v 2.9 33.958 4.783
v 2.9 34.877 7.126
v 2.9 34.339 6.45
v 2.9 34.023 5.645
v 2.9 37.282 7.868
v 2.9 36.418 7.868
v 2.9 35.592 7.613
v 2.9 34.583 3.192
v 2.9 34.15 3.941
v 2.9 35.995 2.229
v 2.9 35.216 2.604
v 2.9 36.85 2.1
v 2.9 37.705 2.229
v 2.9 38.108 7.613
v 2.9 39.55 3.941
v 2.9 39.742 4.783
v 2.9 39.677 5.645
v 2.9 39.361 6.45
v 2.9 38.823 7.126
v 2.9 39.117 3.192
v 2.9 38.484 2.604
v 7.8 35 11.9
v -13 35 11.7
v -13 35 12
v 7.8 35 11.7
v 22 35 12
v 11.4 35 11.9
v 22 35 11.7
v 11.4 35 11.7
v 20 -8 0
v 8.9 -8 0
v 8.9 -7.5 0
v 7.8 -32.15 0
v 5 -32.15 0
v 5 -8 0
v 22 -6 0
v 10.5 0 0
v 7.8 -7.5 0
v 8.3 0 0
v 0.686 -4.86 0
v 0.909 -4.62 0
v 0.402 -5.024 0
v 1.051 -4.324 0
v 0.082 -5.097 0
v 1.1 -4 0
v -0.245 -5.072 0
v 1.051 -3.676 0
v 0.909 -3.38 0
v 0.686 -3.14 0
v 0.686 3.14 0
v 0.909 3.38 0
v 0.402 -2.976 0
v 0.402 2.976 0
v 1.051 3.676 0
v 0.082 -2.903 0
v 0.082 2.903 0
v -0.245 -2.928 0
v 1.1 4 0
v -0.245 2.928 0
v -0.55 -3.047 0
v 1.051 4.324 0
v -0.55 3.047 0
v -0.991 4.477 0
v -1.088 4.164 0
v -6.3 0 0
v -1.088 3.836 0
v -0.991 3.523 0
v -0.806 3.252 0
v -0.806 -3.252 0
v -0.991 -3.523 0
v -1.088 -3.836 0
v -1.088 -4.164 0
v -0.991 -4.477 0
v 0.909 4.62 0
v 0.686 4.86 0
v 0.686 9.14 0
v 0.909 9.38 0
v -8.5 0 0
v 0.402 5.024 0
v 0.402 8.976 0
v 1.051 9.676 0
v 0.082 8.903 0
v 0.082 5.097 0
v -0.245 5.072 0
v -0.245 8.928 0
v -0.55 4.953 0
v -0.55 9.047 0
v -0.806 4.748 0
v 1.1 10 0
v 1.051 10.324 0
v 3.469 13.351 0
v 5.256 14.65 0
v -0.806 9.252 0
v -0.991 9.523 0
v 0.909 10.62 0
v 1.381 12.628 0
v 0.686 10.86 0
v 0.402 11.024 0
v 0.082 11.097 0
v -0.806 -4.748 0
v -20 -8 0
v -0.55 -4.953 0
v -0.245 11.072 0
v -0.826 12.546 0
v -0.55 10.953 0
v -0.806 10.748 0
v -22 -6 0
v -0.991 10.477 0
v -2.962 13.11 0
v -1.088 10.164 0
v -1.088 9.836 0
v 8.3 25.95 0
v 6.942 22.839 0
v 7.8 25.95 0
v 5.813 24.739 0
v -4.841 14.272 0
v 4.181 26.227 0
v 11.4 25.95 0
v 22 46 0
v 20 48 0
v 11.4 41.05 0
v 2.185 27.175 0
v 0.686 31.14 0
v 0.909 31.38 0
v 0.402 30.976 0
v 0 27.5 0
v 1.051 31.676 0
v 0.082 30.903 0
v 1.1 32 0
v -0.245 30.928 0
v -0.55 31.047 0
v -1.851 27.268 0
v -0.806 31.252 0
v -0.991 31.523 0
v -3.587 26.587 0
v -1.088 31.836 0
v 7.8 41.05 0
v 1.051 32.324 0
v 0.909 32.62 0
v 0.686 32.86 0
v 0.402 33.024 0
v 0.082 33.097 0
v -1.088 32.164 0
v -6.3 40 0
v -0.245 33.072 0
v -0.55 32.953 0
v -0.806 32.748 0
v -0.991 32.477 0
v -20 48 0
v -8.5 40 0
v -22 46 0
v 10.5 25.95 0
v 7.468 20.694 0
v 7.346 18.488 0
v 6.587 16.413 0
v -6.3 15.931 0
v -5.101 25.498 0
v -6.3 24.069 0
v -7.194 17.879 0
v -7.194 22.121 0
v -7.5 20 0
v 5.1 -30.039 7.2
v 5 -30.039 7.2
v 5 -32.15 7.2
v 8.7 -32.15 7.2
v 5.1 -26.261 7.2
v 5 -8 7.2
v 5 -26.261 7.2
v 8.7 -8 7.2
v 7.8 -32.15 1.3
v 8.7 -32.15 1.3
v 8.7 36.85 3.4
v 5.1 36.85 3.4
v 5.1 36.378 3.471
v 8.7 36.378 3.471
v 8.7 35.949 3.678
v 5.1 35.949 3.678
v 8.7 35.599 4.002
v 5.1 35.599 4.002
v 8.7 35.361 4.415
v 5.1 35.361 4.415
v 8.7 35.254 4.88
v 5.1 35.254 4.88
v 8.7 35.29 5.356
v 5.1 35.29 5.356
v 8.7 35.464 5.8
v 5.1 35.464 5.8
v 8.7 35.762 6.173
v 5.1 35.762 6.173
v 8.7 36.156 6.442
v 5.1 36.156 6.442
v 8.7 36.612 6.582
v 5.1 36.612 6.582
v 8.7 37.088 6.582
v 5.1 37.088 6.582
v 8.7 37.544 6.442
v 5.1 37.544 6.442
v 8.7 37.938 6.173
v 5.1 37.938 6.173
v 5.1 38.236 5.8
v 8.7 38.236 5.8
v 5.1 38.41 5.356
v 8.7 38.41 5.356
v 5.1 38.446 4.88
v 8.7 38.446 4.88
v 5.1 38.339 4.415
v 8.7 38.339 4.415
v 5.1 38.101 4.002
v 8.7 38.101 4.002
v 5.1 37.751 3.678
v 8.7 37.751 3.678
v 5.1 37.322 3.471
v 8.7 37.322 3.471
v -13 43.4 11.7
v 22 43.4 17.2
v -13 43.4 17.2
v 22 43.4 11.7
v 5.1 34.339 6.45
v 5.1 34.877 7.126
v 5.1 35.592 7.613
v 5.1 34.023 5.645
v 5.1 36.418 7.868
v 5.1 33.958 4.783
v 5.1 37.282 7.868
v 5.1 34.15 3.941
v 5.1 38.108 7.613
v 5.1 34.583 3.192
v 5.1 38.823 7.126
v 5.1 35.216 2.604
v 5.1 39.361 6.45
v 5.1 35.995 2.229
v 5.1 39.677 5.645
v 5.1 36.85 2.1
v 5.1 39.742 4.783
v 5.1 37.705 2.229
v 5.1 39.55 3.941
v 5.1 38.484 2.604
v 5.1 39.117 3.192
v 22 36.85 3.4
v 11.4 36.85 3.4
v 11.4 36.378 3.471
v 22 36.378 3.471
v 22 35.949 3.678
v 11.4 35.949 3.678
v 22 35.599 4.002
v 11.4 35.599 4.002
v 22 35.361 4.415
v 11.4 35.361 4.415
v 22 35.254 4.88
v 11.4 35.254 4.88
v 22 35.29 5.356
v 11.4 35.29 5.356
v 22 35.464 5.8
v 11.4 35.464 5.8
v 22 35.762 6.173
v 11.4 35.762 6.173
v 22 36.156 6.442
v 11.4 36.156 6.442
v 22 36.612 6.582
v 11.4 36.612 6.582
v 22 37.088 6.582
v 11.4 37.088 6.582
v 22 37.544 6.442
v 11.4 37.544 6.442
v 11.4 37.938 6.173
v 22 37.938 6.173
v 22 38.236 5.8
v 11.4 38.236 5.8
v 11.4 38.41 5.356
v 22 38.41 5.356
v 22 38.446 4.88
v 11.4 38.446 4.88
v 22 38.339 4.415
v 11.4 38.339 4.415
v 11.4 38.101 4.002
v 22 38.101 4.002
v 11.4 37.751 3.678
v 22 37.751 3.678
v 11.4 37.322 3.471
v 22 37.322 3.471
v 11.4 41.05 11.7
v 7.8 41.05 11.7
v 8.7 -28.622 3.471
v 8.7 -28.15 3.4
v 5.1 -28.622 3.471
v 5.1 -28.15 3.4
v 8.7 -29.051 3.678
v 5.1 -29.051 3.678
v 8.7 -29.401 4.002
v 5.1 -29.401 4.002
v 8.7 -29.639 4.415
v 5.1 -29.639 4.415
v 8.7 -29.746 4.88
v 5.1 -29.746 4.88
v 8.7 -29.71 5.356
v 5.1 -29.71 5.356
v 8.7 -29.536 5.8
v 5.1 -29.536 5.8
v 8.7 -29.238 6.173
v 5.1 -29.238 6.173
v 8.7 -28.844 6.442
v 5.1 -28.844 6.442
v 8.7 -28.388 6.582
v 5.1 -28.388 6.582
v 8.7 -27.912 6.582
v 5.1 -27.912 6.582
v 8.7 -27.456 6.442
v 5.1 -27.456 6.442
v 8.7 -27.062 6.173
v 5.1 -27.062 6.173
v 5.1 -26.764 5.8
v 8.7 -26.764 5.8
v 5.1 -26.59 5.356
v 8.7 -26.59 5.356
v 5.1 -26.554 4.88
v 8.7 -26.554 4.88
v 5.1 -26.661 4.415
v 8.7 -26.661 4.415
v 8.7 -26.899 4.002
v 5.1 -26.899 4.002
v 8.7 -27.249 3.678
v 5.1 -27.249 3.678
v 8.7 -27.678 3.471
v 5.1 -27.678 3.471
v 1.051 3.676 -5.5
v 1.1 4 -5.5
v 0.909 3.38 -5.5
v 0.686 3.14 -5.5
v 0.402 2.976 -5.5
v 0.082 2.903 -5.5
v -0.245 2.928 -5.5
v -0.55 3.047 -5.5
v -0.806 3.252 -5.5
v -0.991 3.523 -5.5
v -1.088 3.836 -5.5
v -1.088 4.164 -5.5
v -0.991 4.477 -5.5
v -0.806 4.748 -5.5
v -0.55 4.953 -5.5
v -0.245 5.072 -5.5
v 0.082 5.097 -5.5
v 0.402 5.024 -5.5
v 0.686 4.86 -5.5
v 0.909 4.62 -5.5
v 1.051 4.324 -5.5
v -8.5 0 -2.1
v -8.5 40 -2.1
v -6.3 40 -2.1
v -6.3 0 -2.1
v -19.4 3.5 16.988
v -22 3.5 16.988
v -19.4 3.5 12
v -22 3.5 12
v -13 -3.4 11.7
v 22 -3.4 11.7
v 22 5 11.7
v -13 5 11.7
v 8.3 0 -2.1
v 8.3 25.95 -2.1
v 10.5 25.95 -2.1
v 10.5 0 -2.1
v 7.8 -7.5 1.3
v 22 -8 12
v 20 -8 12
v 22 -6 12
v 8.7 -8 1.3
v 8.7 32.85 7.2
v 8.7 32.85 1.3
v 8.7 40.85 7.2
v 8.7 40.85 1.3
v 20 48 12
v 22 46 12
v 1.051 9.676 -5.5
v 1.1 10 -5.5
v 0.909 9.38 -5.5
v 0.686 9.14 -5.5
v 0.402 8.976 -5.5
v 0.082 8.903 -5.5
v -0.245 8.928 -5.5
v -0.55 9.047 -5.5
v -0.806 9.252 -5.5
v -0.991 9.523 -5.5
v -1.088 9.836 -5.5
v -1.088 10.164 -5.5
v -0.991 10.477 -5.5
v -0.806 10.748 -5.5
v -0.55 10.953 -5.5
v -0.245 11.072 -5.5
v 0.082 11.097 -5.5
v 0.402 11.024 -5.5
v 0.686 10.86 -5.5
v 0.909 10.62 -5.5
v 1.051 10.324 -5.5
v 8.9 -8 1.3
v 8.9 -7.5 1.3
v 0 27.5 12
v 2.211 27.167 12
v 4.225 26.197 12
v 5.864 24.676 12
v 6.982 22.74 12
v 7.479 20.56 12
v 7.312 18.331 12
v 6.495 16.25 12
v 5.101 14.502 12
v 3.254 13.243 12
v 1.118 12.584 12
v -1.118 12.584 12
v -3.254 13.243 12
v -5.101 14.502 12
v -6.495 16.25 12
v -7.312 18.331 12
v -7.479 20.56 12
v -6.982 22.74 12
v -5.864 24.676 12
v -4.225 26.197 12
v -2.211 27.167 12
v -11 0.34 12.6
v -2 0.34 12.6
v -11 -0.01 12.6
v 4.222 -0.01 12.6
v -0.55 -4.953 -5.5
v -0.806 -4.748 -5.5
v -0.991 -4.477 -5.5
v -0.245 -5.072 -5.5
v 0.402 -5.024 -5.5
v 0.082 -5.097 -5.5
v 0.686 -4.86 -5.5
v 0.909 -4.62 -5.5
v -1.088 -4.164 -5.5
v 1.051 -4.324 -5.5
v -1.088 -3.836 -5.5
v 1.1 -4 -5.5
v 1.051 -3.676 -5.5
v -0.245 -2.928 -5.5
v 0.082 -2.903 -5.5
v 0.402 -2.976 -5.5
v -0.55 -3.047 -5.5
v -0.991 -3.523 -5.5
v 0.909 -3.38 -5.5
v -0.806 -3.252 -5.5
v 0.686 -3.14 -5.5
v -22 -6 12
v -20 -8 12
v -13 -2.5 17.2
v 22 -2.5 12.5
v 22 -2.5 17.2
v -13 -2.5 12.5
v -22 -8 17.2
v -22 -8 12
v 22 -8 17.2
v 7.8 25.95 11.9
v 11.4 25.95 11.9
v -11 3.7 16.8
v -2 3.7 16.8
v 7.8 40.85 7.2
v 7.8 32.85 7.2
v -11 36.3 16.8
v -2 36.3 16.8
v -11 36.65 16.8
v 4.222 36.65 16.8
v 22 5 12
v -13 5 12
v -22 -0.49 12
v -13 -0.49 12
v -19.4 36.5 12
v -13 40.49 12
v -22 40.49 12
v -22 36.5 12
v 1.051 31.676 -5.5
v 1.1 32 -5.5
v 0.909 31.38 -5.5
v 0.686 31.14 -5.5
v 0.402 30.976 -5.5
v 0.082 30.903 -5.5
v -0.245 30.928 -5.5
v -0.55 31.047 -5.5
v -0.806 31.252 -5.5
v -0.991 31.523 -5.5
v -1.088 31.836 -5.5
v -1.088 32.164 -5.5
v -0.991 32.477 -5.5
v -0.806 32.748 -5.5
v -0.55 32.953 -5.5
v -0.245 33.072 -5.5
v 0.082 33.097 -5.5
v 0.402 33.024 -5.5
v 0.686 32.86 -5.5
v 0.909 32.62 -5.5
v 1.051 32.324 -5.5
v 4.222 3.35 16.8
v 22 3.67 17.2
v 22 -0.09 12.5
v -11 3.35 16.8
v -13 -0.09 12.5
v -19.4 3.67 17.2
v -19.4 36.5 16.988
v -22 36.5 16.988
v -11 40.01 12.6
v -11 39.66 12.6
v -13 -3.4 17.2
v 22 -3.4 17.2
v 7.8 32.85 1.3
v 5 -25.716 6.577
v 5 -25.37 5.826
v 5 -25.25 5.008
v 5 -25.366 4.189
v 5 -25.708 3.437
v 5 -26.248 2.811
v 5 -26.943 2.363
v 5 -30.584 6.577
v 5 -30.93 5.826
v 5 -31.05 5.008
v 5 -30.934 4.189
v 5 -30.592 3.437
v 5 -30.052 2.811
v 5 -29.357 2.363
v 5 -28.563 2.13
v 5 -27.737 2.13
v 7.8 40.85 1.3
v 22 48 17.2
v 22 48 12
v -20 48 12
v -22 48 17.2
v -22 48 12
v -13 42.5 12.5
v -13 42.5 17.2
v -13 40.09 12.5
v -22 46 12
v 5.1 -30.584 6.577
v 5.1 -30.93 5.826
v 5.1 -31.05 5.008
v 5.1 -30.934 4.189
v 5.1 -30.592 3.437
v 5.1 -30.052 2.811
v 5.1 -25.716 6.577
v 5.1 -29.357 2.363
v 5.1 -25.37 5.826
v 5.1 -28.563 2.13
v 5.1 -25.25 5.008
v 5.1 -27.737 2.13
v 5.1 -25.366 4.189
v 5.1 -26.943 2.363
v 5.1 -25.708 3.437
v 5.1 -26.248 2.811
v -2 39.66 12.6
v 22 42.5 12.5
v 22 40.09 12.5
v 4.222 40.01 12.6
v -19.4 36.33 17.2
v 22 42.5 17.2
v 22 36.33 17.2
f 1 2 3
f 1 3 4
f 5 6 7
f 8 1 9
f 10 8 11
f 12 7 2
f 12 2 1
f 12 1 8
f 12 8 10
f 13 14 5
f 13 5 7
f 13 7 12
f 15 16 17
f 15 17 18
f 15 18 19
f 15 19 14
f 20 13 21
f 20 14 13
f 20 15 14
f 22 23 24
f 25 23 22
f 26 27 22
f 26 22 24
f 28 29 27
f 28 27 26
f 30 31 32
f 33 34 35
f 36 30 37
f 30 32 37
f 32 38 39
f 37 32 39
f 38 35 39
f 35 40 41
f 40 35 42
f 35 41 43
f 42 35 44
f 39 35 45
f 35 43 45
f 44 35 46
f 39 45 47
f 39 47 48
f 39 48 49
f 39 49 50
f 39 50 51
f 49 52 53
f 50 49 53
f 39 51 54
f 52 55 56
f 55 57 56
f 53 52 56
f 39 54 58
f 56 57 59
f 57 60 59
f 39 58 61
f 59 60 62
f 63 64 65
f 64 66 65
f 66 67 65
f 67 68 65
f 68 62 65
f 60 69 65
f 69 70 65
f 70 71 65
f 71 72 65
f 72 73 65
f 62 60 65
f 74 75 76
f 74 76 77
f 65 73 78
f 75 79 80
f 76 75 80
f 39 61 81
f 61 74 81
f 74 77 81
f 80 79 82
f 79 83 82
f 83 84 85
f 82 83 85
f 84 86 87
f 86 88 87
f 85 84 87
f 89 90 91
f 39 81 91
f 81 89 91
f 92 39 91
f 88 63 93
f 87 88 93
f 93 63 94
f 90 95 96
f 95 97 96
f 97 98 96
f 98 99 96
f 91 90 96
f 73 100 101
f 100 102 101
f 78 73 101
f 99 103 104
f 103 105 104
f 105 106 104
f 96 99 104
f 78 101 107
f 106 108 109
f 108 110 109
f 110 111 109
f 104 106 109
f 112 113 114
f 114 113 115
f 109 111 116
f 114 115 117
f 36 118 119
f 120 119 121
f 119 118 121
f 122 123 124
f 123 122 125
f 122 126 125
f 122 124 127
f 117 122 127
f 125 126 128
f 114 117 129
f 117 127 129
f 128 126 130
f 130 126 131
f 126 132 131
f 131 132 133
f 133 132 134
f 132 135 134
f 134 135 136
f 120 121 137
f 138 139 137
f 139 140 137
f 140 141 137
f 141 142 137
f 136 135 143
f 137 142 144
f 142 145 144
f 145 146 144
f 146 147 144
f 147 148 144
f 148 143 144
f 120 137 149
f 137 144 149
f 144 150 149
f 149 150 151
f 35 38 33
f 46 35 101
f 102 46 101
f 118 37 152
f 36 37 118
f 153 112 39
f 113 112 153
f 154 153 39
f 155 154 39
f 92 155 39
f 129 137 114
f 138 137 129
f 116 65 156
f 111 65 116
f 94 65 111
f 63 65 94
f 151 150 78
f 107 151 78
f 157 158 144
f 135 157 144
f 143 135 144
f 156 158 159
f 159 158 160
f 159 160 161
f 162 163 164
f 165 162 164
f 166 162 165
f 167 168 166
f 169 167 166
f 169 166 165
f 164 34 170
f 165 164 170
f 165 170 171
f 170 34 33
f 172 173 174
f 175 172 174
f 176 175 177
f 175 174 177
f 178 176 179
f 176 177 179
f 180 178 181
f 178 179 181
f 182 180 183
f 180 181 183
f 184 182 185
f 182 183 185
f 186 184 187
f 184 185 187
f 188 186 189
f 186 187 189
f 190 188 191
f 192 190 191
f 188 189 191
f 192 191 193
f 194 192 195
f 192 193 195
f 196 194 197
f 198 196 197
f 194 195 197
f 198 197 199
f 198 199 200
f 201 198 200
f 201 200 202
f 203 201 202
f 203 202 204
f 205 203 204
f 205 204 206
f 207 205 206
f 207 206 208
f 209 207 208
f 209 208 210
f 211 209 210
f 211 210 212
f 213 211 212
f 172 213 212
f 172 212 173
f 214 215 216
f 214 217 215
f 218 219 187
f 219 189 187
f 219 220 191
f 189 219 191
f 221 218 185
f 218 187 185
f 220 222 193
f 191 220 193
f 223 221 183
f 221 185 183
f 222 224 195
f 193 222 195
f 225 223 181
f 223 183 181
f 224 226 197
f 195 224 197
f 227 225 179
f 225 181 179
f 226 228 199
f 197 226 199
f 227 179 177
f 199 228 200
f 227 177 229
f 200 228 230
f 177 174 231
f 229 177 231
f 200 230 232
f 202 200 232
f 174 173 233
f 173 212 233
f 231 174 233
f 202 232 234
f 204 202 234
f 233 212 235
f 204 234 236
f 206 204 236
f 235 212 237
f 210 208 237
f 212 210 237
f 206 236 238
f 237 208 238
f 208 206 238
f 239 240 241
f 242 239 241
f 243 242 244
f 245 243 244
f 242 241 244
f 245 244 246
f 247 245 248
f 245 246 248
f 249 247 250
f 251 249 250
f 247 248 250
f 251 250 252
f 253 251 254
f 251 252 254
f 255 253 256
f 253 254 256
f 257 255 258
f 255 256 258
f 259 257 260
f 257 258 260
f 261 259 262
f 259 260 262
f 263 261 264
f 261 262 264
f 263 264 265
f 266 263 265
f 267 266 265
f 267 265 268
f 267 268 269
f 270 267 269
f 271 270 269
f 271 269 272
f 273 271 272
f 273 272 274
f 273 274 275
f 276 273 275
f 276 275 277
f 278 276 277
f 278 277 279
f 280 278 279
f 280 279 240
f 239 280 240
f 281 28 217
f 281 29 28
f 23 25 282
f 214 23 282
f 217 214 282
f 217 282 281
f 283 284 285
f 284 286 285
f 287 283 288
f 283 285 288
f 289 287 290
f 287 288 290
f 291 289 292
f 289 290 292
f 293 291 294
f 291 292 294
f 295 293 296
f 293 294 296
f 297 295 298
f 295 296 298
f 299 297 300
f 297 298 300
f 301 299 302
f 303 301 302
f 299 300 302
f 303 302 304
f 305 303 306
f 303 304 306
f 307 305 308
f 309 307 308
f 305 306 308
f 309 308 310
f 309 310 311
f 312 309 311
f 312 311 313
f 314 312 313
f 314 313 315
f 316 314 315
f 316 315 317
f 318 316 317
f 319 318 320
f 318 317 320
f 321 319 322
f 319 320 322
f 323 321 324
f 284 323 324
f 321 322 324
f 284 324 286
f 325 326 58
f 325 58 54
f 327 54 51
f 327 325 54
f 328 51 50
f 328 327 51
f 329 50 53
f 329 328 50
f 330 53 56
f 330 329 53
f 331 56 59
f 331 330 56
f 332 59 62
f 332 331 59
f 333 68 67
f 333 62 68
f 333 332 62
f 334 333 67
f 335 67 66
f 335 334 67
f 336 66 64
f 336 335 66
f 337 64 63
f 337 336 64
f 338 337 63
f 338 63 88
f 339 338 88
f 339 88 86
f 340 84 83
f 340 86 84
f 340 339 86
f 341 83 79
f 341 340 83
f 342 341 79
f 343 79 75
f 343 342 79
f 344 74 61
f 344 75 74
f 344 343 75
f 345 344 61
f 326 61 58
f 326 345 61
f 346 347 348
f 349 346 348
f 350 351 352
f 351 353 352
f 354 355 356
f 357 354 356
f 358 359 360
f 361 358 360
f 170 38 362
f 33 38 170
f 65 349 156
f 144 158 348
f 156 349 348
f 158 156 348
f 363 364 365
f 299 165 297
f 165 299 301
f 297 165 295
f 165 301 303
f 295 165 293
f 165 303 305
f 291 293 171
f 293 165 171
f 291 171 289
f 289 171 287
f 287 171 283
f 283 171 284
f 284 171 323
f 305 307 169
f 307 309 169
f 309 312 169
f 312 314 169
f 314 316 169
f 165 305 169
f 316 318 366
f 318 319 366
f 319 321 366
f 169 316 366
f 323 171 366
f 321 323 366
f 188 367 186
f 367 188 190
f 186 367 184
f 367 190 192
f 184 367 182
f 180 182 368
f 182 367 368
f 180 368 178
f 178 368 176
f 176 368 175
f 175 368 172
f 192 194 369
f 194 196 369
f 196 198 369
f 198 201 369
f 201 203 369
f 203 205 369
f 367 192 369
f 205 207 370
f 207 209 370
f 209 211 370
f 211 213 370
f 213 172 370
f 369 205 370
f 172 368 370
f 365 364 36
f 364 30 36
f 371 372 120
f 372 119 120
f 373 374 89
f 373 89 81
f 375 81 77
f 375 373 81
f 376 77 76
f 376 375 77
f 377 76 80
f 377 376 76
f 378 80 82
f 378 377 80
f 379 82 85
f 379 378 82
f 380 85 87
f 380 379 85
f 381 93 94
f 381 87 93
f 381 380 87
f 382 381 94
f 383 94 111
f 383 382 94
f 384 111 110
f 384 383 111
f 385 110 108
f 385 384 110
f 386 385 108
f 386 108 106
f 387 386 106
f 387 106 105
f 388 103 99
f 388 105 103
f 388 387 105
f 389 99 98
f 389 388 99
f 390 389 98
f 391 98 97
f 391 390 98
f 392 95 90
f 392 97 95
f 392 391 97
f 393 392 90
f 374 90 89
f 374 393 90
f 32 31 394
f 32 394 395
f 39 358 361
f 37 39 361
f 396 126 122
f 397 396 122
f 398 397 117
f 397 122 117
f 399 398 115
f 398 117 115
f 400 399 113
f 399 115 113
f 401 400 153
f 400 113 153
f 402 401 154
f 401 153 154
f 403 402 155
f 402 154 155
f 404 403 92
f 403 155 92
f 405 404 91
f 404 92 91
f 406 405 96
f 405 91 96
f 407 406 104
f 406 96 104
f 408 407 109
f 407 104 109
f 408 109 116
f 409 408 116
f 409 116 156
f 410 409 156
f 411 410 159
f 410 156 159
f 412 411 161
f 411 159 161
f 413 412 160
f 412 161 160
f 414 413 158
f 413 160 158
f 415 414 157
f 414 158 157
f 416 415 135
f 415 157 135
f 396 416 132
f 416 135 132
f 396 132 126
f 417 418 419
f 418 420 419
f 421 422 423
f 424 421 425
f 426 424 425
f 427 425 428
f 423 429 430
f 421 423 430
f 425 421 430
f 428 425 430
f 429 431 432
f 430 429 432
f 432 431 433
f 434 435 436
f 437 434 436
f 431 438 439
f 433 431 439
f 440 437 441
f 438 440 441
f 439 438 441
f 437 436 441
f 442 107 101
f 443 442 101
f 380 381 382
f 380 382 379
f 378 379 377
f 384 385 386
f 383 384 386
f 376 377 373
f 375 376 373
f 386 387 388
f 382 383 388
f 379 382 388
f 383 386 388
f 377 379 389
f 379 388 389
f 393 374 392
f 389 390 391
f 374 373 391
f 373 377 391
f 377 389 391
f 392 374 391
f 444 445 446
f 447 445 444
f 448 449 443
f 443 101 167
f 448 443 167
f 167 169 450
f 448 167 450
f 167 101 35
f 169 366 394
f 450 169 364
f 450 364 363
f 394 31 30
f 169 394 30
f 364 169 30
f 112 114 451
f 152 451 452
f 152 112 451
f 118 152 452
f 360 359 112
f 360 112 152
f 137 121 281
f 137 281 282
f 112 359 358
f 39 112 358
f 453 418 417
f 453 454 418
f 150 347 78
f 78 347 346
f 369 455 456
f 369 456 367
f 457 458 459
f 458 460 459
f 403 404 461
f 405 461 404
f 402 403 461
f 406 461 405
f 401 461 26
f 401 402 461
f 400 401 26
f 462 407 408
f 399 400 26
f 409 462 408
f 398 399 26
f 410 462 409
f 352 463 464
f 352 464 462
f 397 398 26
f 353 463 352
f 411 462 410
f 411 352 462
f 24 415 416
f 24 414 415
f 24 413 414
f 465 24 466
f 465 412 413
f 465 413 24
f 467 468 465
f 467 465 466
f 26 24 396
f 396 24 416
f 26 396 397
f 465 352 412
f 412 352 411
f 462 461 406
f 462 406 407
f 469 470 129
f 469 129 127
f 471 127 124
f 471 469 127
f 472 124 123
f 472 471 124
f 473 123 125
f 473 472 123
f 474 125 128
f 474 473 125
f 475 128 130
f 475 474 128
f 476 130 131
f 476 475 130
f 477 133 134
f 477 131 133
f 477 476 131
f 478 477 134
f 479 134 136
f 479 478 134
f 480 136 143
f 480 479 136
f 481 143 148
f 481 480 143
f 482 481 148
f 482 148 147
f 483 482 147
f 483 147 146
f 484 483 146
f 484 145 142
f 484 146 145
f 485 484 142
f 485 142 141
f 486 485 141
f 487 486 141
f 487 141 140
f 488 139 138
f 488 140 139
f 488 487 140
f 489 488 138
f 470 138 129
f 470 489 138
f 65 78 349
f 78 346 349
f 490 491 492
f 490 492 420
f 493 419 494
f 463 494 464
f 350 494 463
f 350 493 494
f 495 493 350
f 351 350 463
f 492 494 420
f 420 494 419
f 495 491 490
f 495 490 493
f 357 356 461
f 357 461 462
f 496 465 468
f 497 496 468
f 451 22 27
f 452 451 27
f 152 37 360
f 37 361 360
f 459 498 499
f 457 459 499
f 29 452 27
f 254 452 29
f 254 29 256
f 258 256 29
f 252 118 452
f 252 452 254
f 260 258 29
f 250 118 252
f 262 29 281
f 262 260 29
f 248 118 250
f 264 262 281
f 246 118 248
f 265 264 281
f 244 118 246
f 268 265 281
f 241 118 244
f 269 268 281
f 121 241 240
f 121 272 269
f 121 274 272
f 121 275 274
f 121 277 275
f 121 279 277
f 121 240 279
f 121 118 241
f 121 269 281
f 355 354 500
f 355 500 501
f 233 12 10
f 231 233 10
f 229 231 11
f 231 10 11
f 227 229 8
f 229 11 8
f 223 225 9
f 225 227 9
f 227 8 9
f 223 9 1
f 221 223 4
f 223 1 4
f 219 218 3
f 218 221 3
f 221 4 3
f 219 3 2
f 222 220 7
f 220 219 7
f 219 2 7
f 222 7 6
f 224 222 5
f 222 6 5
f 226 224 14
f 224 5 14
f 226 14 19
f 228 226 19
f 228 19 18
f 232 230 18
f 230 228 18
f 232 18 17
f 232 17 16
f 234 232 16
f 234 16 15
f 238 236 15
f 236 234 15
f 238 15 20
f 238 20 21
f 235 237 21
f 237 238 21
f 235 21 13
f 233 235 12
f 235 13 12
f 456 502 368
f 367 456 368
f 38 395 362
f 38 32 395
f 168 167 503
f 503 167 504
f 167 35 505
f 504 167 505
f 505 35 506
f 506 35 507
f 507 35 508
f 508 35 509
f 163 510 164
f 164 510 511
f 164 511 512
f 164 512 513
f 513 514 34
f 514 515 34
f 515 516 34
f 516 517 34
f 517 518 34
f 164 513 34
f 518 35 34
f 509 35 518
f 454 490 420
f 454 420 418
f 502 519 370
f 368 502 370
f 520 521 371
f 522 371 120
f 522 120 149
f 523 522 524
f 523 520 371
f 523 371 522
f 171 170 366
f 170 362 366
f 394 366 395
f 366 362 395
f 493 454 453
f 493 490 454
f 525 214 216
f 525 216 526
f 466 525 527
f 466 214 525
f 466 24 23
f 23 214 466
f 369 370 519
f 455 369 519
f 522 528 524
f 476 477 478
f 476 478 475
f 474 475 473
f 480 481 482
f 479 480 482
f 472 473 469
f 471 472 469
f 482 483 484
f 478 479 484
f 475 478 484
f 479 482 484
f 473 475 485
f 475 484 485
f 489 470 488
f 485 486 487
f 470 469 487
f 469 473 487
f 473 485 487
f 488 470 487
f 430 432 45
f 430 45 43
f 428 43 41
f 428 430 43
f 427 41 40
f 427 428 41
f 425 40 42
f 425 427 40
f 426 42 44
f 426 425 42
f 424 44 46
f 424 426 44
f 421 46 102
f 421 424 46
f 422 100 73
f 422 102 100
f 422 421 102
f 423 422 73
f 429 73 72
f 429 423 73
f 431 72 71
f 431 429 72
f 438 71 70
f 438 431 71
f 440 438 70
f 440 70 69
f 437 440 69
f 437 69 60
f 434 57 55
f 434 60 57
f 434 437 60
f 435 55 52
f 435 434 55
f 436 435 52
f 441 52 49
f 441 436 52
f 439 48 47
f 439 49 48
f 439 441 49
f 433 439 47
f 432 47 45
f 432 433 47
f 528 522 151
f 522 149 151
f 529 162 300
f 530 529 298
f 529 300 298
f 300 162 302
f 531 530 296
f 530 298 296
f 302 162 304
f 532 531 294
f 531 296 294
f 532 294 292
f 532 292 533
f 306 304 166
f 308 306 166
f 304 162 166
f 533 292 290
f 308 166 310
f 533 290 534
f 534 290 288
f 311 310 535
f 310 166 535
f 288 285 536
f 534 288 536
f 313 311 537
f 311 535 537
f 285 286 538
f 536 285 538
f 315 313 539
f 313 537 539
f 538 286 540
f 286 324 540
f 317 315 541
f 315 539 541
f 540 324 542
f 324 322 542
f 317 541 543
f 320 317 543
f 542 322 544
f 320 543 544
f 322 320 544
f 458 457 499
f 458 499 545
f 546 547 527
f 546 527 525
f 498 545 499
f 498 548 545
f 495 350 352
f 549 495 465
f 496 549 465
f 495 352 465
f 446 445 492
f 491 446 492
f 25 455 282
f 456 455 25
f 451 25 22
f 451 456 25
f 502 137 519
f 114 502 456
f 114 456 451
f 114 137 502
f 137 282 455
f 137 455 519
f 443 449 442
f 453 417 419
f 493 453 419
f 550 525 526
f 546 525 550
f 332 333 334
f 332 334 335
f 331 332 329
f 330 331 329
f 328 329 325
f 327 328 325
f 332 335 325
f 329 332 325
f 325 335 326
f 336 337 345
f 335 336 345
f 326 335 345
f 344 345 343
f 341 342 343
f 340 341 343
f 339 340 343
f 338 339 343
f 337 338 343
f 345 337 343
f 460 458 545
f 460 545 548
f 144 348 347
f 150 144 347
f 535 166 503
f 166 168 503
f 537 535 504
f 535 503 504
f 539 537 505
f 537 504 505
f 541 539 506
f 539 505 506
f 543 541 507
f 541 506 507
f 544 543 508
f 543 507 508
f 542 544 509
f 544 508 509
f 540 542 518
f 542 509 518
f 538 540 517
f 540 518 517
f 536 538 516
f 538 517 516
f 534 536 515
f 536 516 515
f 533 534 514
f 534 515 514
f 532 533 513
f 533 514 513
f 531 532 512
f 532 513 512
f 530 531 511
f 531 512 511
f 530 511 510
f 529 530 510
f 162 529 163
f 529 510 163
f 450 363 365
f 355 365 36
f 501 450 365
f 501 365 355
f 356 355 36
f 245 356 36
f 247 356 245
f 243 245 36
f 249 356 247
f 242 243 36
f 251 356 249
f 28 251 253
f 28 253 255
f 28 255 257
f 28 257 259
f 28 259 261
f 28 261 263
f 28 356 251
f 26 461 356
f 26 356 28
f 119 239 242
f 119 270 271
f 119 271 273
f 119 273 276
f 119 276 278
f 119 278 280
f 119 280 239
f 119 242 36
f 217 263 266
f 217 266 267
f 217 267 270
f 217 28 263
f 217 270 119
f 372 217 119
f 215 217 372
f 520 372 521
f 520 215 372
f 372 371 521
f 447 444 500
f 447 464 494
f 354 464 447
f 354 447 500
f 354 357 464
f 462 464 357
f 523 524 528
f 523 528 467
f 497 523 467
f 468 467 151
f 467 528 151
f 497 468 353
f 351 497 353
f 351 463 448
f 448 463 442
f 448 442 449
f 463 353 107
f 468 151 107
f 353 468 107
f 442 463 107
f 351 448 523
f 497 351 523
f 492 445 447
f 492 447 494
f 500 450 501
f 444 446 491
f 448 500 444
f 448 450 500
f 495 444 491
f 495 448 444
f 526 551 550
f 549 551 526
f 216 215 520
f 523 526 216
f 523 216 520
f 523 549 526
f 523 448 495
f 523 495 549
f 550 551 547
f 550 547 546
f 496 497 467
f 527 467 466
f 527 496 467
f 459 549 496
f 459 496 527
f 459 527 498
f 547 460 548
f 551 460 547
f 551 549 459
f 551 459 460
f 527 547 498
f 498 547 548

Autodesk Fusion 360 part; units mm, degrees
ref_plane "工作平面1" through (0, 0, 0) normal (0, 0, 1) x (1, 0, 0)
sketch "草图1" plane through (0, 0, 0) normal (0, 0, 1) x (1, 0, 0)
  line L0 (-26, -22) -> (26, -22)
  line L1 (26, -22) -> (28, -20)
  line L2 (28, -20) -> (28, 20)
  line L3 (28, 20) -> (26, 22)
  line L4 (26, 22) -> (-26, 22)
  line L5 (-26, 22) -> (-28, 20)
  line L6 (-28, 20) -> (-28, -20)
  line L7 (-28, -20) -> (-26, -22)
extrude "56 x 44 x 7 platform" add sketch "草图1" along normal blind 12
ref_plane "工作平面2" through (0, 0, 12) normal (0, 0, 1) x (1, 0, 0)
sketch "草图2" plane through (0, 0, 12) normal (0, 0, 1) x (1, 0, 0)
  line L0 (-28, -22) -> (-20.49, -22)
  line L1 (-20.49, -22) -> (-20.49, 22)
  line L2 (-20.49, 22) -> (-28, 22)
  line L3 (-28, 22) -> (-28, -22)
ref_plane "工作平面3" through (0, 0, 17.2) normal (0, 0, 1) x (1, 0, 0)
sketch "草图3" plane through (0, 0, 17.2) normal (0, 0, 1) x (1, 0, 0)
  line L0 (-28, -22) -> (-16.33, -22)
  line L1 (-16.33, -22) -> (-16.33, 22)
  line L2 (-16.33, 22) -> (-28, 22)
  line L3 (-28, 22) -> (-28, -22)
loft "Dovetail retaining rail 0.8 to 1 -1" add profiles "草图2", "草图3" section 1 section 2
ref_plane "工作平面4" through (0, 0, 11.7) normal (0, 0, 1) x (1, 0, 0)
sketch "草图4" plane through (0, 0, 11.7) normal (0, 0, 1) x (1, 0, 0)
  line L0 (-23.4, -22) -> (-22.5, -22)
  line L1 (-22.5, -22) -> (-22.5, 13)
  line L2 (-22.5, 13) -> (-23.4, 13)
  line L3 (-23.4, 13) -> (-23.4, -22)
extrude "0.9 mm longitudinal flexure slot -1" cut sketch "草图4" along normal blind 5.8
ref_plane "工作平面5" through (0, 0, 11.7) normal (0, 0, 1) x (1, 0, 0)
sketch "草图5" plane through (0, 0, 11.7) normal (0, 0, 1) x (1, 0, 0)
  line L0 (-22.5, -22) -> (-15, -22)
  line L1 (-15, -22) -> (-15, 13)
  line L2 (-15, 13) -> (-22.5, 13)
  line L3 (-22.5, 13) -> (-22.5, -22)
extrude "0.8 mm flexure underside relief -1" cut sketch "草图5" along normal blind 0.8
ref_plane "工作平面6" through (0, 0, 12.6) normal (0, 0, 1) x (1, 0, 0)
sketch "草图6" plane through (0, 0, 12.6) normal (0, 0, 1) x (1, 0, 0)
  line L0 (-20.21, -6) -> (-20.21, 11)
  line L1 (-20.21, 11) -> (-19.66, 11)
  line L2 (-19.66, 11) -> (-19.66, 2)
  line L3 (-19.66, 2) -> (-20.11, -6)
  line L4 (-20.11, -6) -> (-20.21, -6)
ref_plane "工作平面7" through (0, 0, 16.8) normal (0, 0, 1) x (1, 0, 0)
sketch "草图7" plane through (0, 0, 16.8) normal (0, 0, 1) x (1, 0, 0)
  line L0 (-16.85, -6) -> (-16.85, 11)
  line L1 (-16.85, 11) -> (-16.3, 11)
  line L2 (-16.3, 11) -> (-16.3, 2)
  line L3 (-16.3, 2) -> (-16.75, -6)
  line L4 (-16.75, -6) -> (-16.85, -6)
loft "Tapered friction contact rib -1" add profiles "草图6", "草图7" section 1 section 2
ref_plane "工作平面8" through (0, 0, 12) normal (0, 0, 1) x (1, 0, 0)
sketch "草图8" plane through (0, 0, 12) normal (0, 0, 1) x (1, 0, 0)
  line L0 (20.49, -22) -> (28, -22)
  line L1 (28, -22) -> (28, 22)
  line L2 (28, 22) -> (20.49, 22)
  line L3 (20.49, 22) -> (20.49, -22)
ref_plane "工作平面9" through (0, 0, 17.2) normal (0, 0, 1) x (1, 0, 0)
sketch "草图9" plane through (0, 0, 17.2) normal (0, 0, 1) x (1, 0, 0)
  line L0 (16.33, -22) -> (28, -22)
  line L1 (28, -22) -> (28, 22)
  line L2 (28, 22) -> (16.33, 22)
  line L3 (16.33, 22) -> (16.33, -22)
loft "Dovetail retaining rail 0.8 to 1 1" add profiles "草图8", "草图9" section 1 section 2
ref_plane "工作平面10" through (0, 0, 11.7) normal (0, 0, 1) x (1, 0, 0)
sketch "草图10" plane through (0, 0, 11.7) normal (0, 0, 1) x (1, 0, 0)
  line L0 (22.5, -22) -> (23.4, -22)
  line L1 (23.4, -22) -> (23.4, 13)
  line L2 (23.4, 13) -> (22.5, 13)
  line L3 (22.5, 13) -> (22.5, -22)
extrude "0.9 mm longitudinal flexure slot 1" cut sketch "草图10" along normal blind 5.8
ref_plane "工作平面11" through (0, 0, 11.7) normal (0, 0, 1) x (1, 0, 0)
sketch "草图11" plane through (0, 0, 11.7) normal (0, 0, 1) x (1, 0, 0)
  line L0 (15, -22) -> (22.5, -22)
  line L1 (22.5, -22) -> (22.5, 13)
  line L2 (22.5, 13) -> (15, 13)
  line L3 (15, 13) -> (15, -22)
extrude "0.8 mm flexure underside relief 1" cut sketch "草图11" along normal blind 0.8
ref_plane "工作平面12" through (0, 0, 12.6) normal (0, 0, 1) x (1, 0, 0)
sketch "草图12" plane through (0, 0, 12.6) normal (0, 0, 1) x (1, 0, 0)
  line L0 (20.21, -6) -> (20.21, 11)
  line L1 (20.21, 11) -> (19.66, 11)
  line L2 (19.66, 11) -> (19.66, 2)
  line L3 (19.66, 2) -> (20.11, -6)
  line L4 (20.11, -6) -> (20.21, -6)
ref_plane "工作平面13" through (0, 0, 16.8) normal (0, 0, 1) x (1, 0, 0)
sketch "草图13" plane through (0, 0, 16.8) normal (0, 0, 1) x (1, 0, 0)
  line L0 (16.85, -6) -> (16.85, 11)
  line L1 (16.85, 11) -> (16.3, 11)
  line L2 (16.3, 11) -> (16.3, 2)
  line L3 (16.3, 2) -> (16.75, -6)
  line L4 (16.75, -6) -> (16.85, -6)
loft "Tapered friction contact rib 1" add profiles "草图12", "草图13" section 1 section 2
ref_plane "工作平面14" through (0, 0, 12) normal (0, 0, 1) x (1, 0, 0)
sketch "草图14" plane through (0, 0, 12) normal (0, 0, 1) x (1, 0, 0)
  line L0 (-16.5, 19.4) -> (16.5, 19.4)
  line L1 (16.5, 19.4) -> (16.5, 22)
  line L2 (16.5, 22) -> (-16.5, 22)
  line L3 (-16.5, 22) -> (-16.5, 19.4)
extrude "Closed insertion end stop" add sketch "草图14" along normal blind 5.2
ref_plane "工作平面15" through (0, 0, 0) normal (0, 0, 1) x (1, 0, 0)
sketch "草图15" plane through (0, 0, 0) normal (0, 0, 1) x (1, 0, 0)
  circle A0 centre (0, 0) radius 7.5
extrude "15 mm screw and driver access" cut sketch "草图15" along normal blind 12
move_body "Align camera long edge with gimbal arm - 90 degrees" bodies 1 to x (0, 1, 0) y (-1, 0, 0) z (0, 0, 1) at (0, 0, 0)
ref_plane "工作平面16" through (0, 0, 0) normal (0, 0, 1) x (1, 0, 0)
sketch "草图16" plane through (0, 0, 0) normal (0, 0, 1) x (1, 0, 0)
  line L0 (7.8, 5.95) -> (11.4, 5.95)
  line L1 (11.4, 5.95) -> (11.4, 21.05)
  line L2 (11.4, 21.05) -> (7.8, 21.05)
  line L3 (7.8, 21.05) -> (7.8, 5.95)
extrude "Clear original raised tab and root fillet" cut sketch "草图16" along normal blind 11.9
ref_plane "工作平面17" through (0, 0, -2.1) normal (0, 0, 1) x (1, 0, 0)
sketch "草图17" plane through (0, 0, -2.1) normal (0, 0, 1) x (1, 0, 0)
  line L0 (-8.5, -20) -> (-6.3, -20)
  line L1 (-6.3, -20) -> (-6.3, 20)
  line L2 (-6.3, 20) -> (-8.5, 20)
  line L3 (-8.5, 20) -> (-8.5, -20)
extrude "Arm lateral locating shoulder" add sketch "草图17" along normal blind 2.1
ref_plane "工作平面18" through (0, 0, -2.1) normal (0, 0, 1) x (1, 0, 0)
sketch "草图18" plane through (0, 0, -2.1) normal (0, 0, 1) x (1, 0, 0)
  line L0 (8.3, -20) -> (10.5, -20)
  line L1 (10.5, -20) -> (10.5, 20)
  line L2 (10.5, 20) -> (8.3, 20)
  line L3 (8.3, 20) -> (8.3, -20)
extrude "Arm lateral locating shoulder (1)" add sketch "草图18" along normal blind 2.1
ref_plane "工作平面19" through (0, 0, -5.5) normal (0, 0, 1) x (1, 0, 0)
sketch "草图19" plane through (0, 0, -5.5) normal (0, 0, 1) x (1, 0, 0)
  circle A0 centre (0, -24) radius 1.1
extrude "Reinforced 2.2 x 5.5 mm heat stake pin at arm y -4" add sketch "草图19" along normal blind 5.5
ref_plane "工作平面20" through (0, 0, -5.5) normal (0, 0, 1) x (1, 0, 0)
sketch "草图20" plane through (0, 0, -5.5) normal (0, 0, 1) x (1, 0, 0)
  circle A0 centre (0, -16) radius 1.1
extrude "Reinforced 2.2 x 5.5 mm heat stake pin at arm y 4" add sketch "草图20" along normal blind 5.5
ref_plane "工作平面21" through (0, 0, -5.5) normal (0, 0, 1) x (1, 0, 0)
sketch "草图21" plane through (0, 0, -5.5) normal (0, 0, 1) x (1, 0, 0)
  circle A0 centre (0, -10) radius 1.1
extrude "Reinforced 2.2 x 5.5 mm heat stake pin at arm y 10" add sketch "草图21" along normal blind 5.5
ref_plane "工作平面22" through (0, 0, -5.5) normal (0, 0, 1) x (1, 0, 0)
sketch "草图22" plane through (0, 0, -5.5) normal (0, 0, 1) x (1, 0, 0)
  circle A0 centre (0, 12) radius 1.1
extrude "Reinforced 2.2 x 5.5 mm heat stake pin at arm y 32" add sketch "草图22" along normal blind 5.5
ref_plane "工作平面23" through (0, 0, 0) normal (0, 0, 1) x (1, 0, 0)
sketch "草图23" plane through (0, 0, 0) normal (0, 0, 1) x (1, 0, 0)
  line L0 (5, -52.15) -> (8.7, -52.15)
  line L1 (8.7, -52.15) -> (8.7, -27.5)
  line L2 (8.7, -27.5) -> (5, -27.5)
  line L3 (5, -27.5) -> (5, -52.15)
extrude "Ear for original 3.2 mm side hole at arm y -28.15" add sketch "草图23" along normal blind 7.2
ref_plane "工作平面24" through (0, 0, 0) normal (0, 0, 1) x (1, 0, 0)
sketch "草图24" plane through (0, 0, 0) normal (0, 0, 1) x (1, 0, 0)
  line L0 (7.8, -52.15) -> (8.9, -52.15)
  line L1 (8.9, -52.15) -> (8.9, -27.5)
  line L2 (8.9, -27.5) -> (7.8, -27.5)
  line L3 (7.8, -27.5) -> (7.8, -52.15)
extrude "Ear relief around original arm root radius" cut sketch "草图24" along normal blind 1.3
ref_plane "工作平面25" through (4.9, 0, 0) normal (1, 0, 0) x (0, 1, 0)
sketch "草图25" plane through (4.9, 0, 0) normal (1, 0, 0) x (0, 0, -1)
  circle A0 centre (-5, -48.15) radius 1.6
extrude "Side rivet full passage clearance" cut sketch "草图25" along normal blind 20
ref_plane "工作平面26" through (2.9, 0, 0) normal (1, 0, 0) x (0, 1, 0)
sketch "草图26" plane through (2.9, 0, 0) normal (1, 0, 0) x (0, 0, -1)
  circle A0 centre (-5, -48.15) radius 2.9
extrude "Side rivet flange counterbore" cut sketch "草图26" along normal blind 2.2
ref_plane "工作平面27" through (0, 0, 0) normal (0, 0, 1) x (1, 0, 0)
sketch "草图27" plane through (0, 0, 0) normal (0, 0, 1) x (1, 0, 0)
  line L0 (5, 12.85) -> (8.7, 12.85)
  line L1 (8.7, 12.85) -> (8.7, 20.85)
  line L2 (8.7, 20.85) -> (5, 20.85)
  line L3 (5, 20.85) -> (5, 12.85)
extrude "Ear for original 3.2 mm side hole at arm y 36.85" add sketch "草图27" along normal blind 7.2
ref_plane "工作平面28" through (0, 0, 0) normal (0, 0, 1) x (1, 0, 0)
sketch "草图28" plane through (0, 0, 0) normal (0, 0, 1) x (1, 0, 0)
  line L0 (7.8, 12.85) -> (8.9, 12.85)
  line L1 (8.9, 12.85) -> (8.9, 20.85)
  line L2 (8.9, 20.85) -> (7.8, 20.85)
  line L3 (7.8, 20.85) -> (7.8, 12.85)
extrude "Ear relief around original arm root radius (1)" cut sketch "草图28" along normal blind 1.3
ref_plane "工作平面29" through (4.9, 0, 0) normal (1, 0, 0) x (0, 1, 0)
sketch "草图29" plane through (4.9, 0, 0) normal (1, 0, 0) x (0, 0, -1)
  circle A0 centre (-5, 16.85) radius 1.6
extrude "Side rivet full passage clearance (1)" cut sketch "草图29" along normal blind 20
ref_plane "工作平面30" through (2.9, 0, 0) normal (1, 0, 0) x (0, 1, 0)
sketch "草图30" plane through (2.9, 0, 0) normal (1, 0, 0) x (0, 0, -1)
  circle A0 centre (-5, 16.85) radius 2.9
extrude "Side rivet flange counterbore (1)" cut sketch "草图30" along normal blind 2.2
move_body "Move outward toward free end 20.0 mm" bodies 1 to x (1, 0, 0) y (0, 1, 0) z (0, 0, 1) at (0, 20, 0)
ref_plane "工作平面31" through (0, 0, -2.11) normal (0, 0, 1) x (1, 0, 0)
sketch "草图31" plane through (0, 0, -2.11) normal (0, 0, 1) x (1, 0, 0)
  line L0 (8.29, 25.95) -> (10.51, 25.95)
  line L1 (10.51, 25.95) -> (10.51, 40.05)
  line L2 (10.51, 40.05) -> (8.29, 40.05)
  line L3 (8.29, 40.05) -> (8.29, 25.95)
extrude "Trim locating shoulder before raised side ear root" cut sketch "草图31" along normal blind 2.11
